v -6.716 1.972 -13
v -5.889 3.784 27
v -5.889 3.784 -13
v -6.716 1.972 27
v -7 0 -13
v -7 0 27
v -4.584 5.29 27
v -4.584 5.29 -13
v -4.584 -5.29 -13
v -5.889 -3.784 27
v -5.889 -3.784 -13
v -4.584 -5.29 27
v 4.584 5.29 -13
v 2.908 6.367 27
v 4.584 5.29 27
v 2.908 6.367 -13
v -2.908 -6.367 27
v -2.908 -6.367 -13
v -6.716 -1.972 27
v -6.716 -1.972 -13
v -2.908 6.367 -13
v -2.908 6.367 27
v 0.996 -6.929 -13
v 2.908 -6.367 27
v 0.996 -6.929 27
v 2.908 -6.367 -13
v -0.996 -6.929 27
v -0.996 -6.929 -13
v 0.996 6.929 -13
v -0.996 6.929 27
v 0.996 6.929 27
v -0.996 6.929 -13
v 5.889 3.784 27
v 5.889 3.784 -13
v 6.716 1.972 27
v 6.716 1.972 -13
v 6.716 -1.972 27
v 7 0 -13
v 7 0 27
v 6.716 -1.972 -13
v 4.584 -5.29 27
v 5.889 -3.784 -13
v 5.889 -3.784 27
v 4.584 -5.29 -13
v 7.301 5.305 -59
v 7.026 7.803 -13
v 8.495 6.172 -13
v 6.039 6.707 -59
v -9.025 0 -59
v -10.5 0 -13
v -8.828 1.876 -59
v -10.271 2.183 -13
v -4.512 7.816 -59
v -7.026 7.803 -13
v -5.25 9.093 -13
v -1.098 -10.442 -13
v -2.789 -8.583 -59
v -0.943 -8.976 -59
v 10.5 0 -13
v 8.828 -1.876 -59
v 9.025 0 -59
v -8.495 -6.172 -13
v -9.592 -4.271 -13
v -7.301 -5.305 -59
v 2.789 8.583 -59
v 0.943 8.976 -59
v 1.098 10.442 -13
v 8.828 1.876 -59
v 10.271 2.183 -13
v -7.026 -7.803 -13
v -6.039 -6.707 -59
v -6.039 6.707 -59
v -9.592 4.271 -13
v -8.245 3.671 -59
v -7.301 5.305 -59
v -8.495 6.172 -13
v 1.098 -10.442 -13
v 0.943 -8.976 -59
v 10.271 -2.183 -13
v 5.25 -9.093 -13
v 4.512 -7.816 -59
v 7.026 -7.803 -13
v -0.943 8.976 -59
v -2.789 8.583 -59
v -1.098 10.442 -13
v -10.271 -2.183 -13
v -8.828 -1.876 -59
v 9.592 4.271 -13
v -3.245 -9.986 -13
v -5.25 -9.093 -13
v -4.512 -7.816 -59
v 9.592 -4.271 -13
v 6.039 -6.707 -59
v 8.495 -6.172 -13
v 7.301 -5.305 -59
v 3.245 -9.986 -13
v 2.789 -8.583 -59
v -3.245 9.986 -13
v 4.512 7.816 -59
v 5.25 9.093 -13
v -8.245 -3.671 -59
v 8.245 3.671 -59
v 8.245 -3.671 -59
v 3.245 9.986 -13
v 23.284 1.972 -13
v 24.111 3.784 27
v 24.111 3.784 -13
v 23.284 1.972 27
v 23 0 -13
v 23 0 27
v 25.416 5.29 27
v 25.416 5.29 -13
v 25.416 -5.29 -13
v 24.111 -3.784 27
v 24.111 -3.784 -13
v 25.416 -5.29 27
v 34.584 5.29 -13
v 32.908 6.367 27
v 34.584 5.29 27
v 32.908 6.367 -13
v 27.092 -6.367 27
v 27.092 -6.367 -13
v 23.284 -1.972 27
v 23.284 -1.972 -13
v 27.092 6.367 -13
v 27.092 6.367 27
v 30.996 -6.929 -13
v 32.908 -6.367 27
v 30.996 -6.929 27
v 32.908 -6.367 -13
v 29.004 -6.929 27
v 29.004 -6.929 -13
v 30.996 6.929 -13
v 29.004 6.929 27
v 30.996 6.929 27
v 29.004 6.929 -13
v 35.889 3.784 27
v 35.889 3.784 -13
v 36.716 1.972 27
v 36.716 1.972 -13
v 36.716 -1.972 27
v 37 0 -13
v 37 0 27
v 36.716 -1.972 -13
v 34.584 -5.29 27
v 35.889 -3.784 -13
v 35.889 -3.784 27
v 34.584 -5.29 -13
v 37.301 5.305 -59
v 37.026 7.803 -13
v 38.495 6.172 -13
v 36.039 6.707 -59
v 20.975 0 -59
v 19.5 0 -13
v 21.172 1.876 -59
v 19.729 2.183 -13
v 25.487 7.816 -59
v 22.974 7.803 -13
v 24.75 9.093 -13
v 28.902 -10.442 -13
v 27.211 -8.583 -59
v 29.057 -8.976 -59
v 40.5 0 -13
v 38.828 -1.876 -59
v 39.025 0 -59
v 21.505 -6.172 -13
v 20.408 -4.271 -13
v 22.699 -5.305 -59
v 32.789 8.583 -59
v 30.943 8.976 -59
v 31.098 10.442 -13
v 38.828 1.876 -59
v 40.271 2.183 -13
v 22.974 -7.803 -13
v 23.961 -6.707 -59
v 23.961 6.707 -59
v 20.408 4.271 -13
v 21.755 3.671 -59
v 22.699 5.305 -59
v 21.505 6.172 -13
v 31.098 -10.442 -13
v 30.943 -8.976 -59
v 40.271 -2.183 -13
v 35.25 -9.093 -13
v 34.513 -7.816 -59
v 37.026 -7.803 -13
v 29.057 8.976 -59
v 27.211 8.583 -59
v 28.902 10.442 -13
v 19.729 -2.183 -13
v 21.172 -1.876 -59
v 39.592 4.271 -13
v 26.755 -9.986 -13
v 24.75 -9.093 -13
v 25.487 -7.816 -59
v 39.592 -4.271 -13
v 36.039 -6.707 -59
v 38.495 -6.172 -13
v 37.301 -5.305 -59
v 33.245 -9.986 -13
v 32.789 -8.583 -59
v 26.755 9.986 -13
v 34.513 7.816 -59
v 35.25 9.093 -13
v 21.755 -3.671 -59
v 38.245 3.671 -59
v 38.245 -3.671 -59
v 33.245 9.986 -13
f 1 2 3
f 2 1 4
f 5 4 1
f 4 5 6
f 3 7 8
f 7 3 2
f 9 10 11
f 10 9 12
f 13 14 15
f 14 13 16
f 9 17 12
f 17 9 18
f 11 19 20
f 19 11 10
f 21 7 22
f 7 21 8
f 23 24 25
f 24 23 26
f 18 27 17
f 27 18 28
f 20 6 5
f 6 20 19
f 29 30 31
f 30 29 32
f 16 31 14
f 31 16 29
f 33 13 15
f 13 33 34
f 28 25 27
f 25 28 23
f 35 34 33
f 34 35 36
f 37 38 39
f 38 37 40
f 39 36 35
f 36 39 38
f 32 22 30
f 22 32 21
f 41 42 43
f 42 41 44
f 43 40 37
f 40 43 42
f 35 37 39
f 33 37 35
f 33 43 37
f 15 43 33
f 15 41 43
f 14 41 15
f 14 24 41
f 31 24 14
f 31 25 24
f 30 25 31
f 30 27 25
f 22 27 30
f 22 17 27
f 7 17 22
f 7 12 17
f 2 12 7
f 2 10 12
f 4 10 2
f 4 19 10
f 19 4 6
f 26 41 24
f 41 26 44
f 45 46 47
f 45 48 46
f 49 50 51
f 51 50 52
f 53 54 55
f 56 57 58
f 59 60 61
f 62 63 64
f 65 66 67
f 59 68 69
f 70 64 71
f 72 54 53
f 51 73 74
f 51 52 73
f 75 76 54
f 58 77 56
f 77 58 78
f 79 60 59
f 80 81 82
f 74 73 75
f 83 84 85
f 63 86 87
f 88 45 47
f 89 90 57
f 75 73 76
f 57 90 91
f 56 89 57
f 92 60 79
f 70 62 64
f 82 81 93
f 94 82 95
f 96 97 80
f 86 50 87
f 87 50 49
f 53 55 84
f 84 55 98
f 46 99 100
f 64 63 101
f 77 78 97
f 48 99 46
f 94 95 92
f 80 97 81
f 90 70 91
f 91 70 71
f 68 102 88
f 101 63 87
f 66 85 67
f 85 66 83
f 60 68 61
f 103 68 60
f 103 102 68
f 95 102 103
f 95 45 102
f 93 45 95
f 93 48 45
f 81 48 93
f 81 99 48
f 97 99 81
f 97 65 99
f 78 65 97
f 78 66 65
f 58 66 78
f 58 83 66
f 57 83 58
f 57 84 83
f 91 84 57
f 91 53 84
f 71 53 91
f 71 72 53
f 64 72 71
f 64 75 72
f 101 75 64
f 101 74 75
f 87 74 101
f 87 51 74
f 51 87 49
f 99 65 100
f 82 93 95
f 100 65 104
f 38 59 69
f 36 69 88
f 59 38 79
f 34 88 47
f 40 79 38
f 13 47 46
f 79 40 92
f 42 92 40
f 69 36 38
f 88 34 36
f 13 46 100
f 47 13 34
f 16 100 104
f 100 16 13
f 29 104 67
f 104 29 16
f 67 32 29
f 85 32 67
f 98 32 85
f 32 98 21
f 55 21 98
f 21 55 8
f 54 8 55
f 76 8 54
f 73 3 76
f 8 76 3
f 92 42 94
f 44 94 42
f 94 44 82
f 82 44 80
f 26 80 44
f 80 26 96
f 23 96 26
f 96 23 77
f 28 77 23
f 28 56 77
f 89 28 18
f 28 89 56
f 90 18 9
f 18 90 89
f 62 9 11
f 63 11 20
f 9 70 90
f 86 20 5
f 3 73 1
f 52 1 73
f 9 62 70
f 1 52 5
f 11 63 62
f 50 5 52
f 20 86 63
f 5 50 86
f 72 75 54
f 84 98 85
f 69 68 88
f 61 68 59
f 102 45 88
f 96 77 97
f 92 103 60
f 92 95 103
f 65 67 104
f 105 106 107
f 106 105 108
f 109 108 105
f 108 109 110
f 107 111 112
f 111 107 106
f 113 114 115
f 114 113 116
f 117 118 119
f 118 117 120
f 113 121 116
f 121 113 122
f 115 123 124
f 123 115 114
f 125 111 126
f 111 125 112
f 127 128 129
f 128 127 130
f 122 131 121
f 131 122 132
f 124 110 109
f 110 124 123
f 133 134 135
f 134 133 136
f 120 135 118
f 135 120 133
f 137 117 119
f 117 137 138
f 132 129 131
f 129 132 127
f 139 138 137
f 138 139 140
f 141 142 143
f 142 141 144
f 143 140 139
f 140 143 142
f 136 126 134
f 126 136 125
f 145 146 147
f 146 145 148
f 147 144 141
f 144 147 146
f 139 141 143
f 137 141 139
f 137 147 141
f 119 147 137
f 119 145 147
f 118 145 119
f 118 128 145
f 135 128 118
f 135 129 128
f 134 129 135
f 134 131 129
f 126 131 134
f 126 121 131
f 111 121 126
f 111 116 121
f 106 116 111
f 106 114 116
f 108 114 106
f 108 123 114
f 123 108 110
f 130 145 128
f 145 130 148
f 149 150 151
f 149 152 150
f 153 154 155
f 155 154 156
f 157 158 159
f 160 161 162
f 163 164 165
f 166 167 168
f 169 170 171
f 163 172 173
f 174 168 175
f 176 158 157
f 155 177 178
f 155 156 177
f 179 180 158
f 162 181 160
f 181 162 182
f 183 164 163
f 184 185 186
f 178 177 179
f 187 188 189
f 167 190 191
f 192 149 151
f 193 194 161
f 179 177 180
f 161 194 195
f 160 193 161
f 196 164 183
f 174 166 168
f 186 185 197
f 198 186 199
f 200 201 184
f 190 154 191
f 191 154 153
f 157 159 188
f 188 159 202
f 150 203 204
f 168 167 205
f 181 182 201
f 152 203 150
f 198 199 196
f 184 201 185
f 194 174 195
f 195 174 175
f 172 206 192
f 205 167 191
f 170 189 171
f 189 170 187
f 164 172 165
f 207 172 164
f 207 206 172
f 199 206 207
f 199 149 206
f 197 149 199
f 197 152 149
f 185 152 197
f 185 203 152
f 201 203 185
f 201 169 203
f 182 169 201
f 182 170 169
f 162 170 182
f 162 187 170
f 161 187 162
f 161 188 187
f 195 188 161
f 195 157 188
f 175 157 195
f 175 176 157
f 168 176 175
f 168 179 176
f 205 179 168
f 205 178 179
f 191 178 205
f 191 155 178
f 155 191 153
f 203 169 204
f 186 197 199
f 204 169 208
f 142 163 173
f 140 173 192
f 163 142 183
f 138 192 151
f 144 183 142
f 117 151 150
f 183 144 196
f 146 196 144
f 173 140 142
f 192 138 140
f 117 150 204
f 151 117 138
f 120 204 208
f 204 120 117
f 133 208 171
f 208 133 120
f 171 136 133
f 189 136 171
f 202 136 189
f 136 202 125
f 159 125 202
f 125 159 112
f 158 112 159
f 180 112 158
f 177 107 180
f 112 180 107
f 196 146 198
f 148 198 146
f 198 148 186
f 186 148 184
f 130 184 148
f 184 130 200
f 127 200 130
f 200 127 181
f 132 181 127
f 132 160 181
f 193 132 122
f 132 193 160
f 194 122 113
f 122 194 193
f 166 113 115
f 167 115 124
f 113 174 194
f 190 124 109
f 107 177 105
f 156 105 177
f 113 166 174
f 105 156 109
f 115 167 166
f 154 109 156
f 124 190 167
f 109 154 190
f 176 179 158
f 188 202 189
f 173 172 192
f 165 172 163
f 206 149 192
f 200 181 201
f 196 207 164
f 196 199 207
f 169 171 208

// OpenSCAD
DiameterEndEdge = 18;
DiameterEndInner = 14;

//I am thinking of implementing a spiral system to aid in assembly of some pieces.
module testCore(){
rotate([0,180,0]){
	union(){

		translate([0,0,-4]) cylinder(h = 46, d = DiameterEndInner, center = true);

		translate([0,0,36]) cylinder(h = 46, d1 = DiameterEndEdge+3,d2 = DiameterEndEdge +.05, center = true);

		}
}
}
testCore();
translate([30, 0, 0]){testCore();}
